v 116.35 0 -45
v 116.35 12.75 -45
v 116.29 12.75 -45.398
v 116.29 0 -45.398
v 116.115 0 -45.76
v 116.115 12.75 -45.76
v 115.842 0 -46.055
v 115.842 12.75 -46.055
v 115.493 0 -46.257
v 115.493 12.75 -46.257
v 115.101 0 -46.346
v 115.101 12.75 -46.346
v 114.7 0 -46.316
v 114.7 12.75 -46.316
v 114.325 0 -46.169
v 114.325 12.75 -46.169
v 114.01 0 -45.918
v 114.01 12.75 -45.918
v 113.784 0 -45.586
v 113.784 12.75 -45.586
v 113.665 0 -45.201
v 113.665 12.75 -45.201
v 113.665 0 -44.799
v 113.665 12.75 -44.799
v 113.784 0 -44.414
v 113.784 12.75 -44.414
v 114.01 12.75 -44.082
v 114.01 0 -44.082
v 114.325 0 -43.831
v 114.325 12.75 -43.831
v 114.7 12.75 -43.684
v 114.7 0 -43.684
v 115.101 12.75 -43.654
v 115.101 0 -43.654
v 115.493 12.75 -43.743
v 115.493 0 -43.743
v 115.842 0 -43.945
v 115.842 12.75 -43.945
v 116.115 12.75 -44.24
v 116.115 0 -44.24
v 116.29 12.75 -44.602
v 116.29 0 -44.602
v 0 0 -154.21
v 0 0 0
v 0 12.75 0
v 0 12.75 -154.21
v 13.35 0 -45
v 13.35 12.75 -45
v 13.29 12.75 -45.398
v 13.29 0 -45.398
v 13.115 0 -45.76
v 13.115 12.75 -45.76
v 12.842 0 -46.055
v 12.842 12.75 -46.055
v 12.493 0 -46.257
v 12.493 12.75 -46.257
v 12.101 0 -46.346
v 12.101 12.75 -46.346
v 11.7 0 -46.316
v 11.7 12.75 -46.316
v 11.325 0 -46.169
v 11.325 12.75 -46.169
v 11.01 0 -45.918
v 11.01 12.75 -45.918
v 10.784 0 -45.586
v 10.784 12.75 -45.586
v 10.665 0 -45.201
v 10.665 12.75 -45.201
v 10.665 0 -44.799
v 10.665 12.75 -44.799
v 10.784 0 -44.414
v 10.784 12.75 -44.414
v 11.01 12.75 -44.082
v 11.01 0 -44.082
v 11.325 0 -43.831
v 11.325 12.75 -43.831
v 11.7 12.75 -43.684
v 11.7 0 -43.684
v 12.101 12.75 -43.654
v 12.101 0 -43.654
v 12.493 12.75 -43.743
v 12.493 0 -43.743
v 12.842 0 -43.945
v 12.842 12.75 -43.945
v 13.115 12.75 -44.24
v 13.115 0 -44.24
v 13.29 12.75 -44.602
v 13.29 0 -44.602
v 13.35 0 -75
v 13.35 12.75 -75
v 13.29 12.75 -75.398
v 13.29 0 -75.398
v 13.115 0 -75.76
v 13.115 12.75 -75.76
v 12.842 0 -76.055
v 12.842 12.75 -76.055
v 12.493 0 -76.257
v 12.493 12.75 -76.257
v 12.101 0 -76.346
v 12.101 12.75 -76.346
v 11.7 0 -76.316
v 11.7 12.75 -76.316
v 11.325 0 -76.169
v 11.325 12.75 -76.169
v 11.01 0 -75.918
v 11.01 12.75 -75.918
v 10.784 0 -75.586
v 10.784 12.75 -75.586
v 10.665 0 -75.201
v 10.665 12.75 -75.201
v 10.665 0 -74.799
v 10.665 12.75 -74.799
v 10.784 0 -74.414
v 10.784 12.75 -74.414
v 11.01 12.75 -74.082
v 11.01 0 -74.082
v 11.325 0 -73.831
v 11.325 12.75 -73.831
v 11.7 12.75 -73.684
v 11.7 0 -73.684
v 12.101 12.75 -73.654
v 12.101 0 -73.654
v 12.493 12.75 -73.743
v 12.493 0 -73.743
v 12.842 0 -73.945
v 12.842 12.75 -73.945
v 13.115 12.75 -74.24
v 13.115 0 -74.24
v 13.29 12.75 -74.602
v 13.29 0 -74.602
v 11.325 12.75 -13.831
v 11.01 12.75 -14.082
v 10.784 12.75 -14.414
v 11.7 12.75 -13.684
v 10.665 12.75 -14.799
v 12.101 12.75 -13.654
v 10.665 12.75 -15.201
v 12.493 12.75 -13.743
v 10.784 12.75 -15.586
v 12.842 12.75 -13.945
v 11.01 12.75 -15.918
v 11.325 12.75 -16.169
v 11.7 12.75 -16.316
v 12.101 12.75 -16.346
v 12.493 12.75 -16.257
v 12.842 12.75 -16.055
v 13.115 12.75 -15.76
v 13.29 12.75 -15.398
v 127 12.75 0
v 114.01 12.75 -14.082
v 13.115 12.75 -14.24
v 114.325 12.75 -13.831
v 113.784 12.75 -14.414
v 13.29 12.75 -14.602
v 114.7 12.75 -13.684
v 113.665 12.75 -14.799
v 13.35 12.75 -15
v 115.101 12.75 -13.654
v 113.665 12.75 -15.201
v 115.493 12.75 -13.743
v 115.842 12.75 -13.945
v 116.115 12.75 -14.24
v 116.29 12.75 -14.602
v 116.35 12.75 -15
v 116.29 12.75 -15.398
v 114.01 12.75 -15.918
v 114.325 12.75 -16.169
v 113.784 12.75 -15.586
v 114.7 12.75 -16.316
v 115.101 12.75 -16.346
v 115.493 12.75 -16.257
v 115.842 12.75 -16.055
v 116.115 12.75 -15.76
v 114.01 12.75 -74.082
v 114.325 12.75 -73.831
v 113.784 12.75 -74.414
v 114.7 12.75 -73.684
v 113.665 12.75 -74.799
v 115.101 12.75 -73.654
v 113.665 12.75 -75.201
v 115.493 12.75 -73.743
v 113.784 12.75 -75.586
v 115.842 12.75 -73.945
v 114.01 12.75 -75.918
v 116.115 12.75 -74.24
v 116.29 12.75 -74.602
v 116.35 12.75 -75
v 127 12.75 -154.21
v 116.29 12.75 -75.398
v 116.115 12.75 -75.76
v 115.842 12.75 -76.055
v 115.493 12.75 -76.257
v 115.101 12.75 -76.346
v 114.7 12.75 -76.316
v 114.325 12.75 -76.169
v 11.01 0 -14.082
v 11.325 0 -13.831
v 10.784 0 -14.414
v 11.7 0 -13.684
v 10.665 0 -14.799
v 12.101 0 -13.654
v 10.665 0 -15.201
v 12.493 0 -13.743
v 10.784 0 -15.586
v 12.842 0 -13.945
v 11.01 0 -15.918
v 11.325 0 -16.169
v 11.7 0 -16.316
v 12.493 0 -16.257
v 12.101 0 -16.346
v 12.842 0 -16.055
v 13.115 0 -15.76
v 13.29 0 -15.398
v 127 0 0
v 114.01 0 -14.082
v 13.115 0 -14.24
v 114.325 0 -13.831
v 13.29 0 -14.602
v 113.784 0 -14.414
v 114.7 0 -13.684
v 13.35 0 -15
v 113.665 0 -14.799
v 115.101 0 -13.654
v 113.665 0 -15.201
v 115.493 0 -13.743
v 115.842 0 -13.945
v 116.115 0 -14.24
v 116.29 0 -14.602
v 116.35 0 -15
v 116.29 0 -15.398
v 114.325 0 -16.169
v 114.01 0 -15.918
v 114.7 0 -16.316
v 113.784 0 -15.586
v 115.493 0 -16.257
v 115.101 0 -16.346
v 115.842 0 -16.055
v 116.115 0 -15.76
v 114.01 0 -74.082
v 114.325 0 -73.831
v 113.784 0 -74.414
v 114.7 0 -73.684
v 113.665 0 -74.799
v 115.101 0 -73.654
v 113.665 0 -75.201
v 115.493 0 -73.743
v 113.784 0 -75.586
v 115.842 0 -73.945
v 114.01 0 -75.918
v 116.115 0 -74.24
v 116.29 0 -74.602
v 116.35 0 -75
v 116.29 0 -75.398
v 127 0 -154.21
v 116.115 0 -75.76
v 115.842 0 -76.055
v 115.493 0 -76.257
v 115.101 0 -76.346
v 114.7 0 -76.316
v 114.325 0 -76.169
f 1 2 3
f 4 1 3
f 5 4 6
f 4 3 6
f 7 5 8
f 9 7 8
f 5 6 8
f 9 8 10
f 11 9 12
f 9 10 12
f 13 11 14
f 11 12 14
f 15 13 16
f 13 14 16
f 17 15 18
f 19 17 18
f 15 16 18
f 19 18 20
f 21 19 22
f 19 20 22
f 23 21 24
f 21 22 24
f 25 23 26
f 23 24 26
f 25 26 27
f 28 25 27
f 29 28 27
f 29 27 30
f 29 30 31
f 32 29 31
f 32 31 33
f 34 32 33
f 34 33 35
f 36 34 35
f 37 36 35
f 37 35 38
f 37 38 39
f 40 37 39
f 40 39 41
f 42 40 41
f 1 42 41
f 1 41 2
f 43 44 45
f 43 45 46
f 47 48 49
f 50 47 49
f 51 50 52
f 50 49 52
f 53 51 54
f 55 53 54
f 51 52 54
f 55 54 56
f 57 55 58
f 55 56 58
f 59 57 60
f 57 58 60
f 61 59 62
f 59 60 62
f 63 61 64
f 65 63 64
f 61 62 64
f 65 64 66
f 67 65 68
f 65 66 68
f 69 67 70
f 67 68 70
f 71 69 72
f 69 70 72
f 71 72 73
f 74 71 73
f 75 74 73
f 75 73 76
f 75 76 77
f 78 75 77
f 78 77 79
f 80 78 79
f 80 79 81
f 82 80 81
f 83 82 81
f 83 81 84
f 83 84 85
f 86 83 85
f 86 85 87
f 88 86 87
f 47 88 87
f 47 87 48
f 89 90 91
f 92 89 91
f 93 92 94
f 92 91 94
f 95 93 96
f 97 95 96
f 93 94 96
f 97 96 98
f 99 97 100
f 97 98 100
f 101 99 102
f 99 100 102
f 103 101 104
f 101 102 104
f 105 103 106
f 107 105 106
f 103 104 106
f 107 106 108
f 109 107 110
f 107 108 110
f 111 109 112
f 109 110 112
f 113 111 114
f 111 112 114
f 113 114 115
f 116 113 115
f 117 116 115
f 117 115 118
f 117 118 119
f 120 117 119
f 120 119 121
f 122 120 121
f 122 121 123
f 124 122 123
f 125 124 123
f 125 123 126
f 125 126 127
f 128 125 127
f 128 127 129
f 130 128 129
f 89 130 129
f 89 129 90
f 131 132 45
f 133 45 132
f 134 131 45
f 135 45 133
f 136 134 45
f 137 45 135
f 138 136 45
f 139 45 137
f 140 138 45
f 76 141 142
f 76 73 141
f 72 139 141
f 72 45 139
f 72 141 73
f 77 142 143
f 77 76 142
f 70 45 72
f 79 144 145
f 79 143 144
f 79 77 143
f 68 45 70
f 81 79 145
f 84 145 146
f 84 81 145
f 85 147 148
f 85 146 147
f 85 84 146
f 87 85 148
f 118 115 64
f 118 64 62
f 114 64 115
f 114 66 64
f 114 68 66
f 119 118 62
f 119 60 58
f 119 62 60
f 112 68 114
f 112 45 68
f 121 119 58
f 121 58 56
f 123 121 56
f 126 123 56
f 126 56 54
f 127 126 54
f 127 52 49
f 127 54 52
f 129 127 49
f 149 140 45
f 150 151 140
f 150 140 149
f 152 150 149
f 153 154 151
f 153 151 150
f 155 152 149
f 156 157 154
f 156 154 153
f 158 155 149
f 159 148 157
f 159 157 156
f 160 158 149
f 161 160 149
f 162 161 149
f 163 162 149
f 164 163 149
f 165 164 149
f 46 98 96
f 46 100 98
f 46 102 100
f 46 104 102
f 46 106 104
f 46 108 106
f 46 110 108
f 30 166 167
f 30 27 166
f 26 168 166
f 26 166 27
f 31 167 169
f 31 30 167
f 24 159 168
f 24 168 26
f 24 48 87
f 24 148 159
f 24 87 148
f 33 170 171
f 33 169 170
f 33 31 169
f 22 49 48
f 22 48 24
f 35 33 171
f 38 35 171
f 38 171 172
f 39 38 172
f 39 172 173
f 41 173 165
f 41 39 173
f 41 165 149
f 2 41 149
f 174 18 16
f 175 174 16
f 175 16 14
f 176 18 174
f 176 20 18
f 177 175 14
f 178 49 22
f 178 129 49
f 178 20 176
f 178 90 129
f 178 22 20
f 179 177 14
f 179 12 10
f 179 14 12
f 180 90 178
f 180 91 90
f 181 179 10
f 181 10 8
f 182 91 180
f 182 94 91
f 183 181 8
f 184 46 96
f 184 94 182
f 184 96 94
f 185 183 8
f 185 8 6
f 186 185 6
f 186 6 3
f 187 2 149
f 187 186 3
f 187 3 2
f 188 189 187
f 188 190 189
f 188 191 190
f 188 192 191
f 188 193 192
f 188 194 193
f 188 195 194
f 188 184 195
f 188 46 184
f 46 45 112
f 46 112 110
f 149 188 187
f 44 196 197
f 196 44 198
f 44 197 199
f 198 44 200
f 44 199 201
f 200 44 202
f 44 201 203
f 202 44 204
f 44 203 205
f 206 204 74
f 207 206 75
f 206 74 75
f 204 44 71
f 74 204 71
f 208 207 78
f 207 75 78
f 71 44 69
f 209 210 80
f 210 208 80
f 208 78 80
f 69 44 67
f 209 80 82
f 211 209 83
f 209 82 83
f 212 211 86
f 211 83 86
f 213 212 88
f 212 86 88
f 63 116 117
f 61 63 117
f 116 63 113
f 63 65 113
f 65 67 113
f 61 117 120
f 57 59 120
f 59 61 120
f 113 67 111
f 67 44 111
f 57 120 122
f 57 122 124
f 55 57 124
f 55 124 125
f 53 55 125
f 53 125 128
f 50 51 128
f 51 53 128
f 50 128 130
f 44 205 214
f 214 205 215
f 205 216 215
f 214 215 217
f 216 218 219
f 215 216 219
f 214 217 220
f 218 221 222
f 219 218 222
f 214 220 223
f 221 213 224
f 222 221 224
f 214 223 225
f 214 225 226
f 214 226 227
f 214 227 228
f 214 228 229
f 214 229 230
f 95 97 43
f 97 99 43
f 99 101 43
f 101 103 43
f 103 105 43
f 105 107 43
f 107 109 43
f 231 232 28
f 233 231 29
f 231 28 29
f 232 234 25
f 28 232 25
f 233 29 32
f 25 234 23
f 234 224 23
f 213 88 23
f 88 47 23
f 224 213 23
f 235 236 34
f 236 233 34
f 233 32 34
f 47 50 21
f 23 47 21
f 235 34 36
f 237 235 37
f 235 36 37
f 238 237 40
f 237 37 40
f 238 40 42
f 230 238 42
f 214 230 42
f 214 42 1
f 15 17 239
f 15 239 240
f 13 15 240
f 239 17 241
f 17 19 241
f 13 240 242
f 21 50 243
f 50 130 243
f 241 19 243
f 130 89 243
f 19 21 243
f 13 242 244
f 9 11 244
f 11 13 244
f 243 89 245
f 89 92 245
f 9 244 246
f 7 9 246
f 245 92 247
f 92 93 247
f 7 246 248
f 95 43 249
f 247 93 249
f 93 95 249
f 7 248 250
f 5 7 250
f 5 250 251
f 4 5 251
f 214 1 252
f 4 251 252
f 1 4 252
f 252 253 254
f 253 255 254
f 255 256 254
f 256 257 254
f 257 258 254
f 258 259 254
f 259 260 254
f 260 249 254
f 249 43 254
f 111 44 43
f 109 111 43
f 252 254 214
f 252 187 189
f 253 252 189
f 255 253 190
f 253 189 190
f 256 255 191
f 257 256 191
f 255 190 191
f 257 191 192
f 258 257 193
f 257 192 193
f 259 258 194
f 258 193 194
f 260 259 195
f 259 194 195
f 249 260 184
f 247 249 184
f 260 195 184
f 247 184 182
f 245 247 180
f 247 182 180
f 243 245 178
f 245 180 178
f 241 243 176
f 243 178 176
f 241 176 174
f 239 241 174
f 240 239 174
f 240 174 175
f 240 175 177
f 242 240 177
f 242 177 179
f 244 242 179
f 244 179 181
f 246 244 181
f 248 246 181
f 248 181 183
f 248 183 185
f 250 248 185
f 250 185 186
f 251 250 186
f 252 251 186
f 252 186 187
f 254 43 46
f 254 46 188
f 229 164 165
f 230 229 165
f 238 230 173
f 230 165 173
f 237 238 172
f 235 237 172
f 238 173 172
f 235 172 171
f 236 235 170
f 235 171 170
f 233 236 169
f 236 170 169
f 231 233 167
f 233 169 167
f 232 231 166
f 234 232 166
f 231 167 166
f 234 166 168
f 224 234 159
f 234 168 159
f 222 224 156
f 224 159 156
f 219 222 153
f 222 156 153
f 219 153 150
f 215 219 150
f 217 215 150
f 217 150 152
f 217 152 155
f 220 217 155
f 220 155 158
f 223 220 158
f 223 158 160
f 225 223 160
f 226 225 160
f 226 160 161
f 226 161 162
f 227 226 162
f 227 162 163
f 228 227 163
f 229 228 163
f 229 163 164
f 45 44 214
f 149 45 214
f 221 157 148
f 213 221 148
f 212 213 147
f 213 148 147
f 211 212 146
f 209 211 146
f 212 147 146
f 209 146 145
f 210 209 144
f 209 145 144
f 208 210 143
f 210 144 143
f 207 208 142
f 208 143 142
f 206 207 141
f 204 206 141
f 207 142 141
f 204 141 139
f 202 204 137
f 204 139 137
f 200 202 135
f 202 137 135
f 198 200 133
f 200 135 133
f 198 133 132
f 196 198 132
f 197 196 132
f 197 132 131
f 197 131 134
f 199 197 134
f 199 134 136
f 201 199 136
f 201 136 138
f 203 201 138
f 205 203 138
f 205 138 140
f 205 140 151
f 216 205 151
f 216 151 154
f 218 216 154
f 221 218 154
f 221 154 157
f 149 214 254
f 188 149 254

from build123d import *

# Parameters (mm, degrees)
SKETCH1_W           = 127
SKETCH1_H           = 154.21
BOSS_EXTRUDE1_DEPTH = 12.75
SKETCH2_R           = 1.35
CUT_EXTRUDE1_DEPTH  = 13.75


with BuildPart() as part:
    # Sketch1 → Boss-Extrude1 (new body)
    with BuildSketch(Plane(origin=(0, 0, 0), x_dir=(1, 0, 0), z_dir=(0, 1, 0))):
        with Locations((63.5, 77.105)):
            Rectangle(SKETCH1_W, SKETCH1_H)
    extrude(amount=BOSS_EXTRUDE1_DEPTH)

    # Sketch2 → Cut-Extrude1 (cut, through all)
    with BuildSketch(Plane(origin=(0, 12.75, 0), x_dir=(1, 0, 0), z_dir=(0, 1, 0))):
        with Locations((12, 15)):
            Circle(SKETCH2_R)
        with Locations((115, 15)):
            Circle(SKETCH2_R)
        with Locations((115, 45)):
            Circle(SKETCH2_R)
        with Locations((12, 45)):
            Circle(SKETCH2_R)
        with Locations((12, 75)):
            Circle(SKETCH2_R)
        with Locations((115, 75)):
            Circle(SKETCH2_R)
    extrude(amount=-CUT_EXTRUDE1_DEPTH, mode=Mode.SUBTRACT)


solid = part.part
